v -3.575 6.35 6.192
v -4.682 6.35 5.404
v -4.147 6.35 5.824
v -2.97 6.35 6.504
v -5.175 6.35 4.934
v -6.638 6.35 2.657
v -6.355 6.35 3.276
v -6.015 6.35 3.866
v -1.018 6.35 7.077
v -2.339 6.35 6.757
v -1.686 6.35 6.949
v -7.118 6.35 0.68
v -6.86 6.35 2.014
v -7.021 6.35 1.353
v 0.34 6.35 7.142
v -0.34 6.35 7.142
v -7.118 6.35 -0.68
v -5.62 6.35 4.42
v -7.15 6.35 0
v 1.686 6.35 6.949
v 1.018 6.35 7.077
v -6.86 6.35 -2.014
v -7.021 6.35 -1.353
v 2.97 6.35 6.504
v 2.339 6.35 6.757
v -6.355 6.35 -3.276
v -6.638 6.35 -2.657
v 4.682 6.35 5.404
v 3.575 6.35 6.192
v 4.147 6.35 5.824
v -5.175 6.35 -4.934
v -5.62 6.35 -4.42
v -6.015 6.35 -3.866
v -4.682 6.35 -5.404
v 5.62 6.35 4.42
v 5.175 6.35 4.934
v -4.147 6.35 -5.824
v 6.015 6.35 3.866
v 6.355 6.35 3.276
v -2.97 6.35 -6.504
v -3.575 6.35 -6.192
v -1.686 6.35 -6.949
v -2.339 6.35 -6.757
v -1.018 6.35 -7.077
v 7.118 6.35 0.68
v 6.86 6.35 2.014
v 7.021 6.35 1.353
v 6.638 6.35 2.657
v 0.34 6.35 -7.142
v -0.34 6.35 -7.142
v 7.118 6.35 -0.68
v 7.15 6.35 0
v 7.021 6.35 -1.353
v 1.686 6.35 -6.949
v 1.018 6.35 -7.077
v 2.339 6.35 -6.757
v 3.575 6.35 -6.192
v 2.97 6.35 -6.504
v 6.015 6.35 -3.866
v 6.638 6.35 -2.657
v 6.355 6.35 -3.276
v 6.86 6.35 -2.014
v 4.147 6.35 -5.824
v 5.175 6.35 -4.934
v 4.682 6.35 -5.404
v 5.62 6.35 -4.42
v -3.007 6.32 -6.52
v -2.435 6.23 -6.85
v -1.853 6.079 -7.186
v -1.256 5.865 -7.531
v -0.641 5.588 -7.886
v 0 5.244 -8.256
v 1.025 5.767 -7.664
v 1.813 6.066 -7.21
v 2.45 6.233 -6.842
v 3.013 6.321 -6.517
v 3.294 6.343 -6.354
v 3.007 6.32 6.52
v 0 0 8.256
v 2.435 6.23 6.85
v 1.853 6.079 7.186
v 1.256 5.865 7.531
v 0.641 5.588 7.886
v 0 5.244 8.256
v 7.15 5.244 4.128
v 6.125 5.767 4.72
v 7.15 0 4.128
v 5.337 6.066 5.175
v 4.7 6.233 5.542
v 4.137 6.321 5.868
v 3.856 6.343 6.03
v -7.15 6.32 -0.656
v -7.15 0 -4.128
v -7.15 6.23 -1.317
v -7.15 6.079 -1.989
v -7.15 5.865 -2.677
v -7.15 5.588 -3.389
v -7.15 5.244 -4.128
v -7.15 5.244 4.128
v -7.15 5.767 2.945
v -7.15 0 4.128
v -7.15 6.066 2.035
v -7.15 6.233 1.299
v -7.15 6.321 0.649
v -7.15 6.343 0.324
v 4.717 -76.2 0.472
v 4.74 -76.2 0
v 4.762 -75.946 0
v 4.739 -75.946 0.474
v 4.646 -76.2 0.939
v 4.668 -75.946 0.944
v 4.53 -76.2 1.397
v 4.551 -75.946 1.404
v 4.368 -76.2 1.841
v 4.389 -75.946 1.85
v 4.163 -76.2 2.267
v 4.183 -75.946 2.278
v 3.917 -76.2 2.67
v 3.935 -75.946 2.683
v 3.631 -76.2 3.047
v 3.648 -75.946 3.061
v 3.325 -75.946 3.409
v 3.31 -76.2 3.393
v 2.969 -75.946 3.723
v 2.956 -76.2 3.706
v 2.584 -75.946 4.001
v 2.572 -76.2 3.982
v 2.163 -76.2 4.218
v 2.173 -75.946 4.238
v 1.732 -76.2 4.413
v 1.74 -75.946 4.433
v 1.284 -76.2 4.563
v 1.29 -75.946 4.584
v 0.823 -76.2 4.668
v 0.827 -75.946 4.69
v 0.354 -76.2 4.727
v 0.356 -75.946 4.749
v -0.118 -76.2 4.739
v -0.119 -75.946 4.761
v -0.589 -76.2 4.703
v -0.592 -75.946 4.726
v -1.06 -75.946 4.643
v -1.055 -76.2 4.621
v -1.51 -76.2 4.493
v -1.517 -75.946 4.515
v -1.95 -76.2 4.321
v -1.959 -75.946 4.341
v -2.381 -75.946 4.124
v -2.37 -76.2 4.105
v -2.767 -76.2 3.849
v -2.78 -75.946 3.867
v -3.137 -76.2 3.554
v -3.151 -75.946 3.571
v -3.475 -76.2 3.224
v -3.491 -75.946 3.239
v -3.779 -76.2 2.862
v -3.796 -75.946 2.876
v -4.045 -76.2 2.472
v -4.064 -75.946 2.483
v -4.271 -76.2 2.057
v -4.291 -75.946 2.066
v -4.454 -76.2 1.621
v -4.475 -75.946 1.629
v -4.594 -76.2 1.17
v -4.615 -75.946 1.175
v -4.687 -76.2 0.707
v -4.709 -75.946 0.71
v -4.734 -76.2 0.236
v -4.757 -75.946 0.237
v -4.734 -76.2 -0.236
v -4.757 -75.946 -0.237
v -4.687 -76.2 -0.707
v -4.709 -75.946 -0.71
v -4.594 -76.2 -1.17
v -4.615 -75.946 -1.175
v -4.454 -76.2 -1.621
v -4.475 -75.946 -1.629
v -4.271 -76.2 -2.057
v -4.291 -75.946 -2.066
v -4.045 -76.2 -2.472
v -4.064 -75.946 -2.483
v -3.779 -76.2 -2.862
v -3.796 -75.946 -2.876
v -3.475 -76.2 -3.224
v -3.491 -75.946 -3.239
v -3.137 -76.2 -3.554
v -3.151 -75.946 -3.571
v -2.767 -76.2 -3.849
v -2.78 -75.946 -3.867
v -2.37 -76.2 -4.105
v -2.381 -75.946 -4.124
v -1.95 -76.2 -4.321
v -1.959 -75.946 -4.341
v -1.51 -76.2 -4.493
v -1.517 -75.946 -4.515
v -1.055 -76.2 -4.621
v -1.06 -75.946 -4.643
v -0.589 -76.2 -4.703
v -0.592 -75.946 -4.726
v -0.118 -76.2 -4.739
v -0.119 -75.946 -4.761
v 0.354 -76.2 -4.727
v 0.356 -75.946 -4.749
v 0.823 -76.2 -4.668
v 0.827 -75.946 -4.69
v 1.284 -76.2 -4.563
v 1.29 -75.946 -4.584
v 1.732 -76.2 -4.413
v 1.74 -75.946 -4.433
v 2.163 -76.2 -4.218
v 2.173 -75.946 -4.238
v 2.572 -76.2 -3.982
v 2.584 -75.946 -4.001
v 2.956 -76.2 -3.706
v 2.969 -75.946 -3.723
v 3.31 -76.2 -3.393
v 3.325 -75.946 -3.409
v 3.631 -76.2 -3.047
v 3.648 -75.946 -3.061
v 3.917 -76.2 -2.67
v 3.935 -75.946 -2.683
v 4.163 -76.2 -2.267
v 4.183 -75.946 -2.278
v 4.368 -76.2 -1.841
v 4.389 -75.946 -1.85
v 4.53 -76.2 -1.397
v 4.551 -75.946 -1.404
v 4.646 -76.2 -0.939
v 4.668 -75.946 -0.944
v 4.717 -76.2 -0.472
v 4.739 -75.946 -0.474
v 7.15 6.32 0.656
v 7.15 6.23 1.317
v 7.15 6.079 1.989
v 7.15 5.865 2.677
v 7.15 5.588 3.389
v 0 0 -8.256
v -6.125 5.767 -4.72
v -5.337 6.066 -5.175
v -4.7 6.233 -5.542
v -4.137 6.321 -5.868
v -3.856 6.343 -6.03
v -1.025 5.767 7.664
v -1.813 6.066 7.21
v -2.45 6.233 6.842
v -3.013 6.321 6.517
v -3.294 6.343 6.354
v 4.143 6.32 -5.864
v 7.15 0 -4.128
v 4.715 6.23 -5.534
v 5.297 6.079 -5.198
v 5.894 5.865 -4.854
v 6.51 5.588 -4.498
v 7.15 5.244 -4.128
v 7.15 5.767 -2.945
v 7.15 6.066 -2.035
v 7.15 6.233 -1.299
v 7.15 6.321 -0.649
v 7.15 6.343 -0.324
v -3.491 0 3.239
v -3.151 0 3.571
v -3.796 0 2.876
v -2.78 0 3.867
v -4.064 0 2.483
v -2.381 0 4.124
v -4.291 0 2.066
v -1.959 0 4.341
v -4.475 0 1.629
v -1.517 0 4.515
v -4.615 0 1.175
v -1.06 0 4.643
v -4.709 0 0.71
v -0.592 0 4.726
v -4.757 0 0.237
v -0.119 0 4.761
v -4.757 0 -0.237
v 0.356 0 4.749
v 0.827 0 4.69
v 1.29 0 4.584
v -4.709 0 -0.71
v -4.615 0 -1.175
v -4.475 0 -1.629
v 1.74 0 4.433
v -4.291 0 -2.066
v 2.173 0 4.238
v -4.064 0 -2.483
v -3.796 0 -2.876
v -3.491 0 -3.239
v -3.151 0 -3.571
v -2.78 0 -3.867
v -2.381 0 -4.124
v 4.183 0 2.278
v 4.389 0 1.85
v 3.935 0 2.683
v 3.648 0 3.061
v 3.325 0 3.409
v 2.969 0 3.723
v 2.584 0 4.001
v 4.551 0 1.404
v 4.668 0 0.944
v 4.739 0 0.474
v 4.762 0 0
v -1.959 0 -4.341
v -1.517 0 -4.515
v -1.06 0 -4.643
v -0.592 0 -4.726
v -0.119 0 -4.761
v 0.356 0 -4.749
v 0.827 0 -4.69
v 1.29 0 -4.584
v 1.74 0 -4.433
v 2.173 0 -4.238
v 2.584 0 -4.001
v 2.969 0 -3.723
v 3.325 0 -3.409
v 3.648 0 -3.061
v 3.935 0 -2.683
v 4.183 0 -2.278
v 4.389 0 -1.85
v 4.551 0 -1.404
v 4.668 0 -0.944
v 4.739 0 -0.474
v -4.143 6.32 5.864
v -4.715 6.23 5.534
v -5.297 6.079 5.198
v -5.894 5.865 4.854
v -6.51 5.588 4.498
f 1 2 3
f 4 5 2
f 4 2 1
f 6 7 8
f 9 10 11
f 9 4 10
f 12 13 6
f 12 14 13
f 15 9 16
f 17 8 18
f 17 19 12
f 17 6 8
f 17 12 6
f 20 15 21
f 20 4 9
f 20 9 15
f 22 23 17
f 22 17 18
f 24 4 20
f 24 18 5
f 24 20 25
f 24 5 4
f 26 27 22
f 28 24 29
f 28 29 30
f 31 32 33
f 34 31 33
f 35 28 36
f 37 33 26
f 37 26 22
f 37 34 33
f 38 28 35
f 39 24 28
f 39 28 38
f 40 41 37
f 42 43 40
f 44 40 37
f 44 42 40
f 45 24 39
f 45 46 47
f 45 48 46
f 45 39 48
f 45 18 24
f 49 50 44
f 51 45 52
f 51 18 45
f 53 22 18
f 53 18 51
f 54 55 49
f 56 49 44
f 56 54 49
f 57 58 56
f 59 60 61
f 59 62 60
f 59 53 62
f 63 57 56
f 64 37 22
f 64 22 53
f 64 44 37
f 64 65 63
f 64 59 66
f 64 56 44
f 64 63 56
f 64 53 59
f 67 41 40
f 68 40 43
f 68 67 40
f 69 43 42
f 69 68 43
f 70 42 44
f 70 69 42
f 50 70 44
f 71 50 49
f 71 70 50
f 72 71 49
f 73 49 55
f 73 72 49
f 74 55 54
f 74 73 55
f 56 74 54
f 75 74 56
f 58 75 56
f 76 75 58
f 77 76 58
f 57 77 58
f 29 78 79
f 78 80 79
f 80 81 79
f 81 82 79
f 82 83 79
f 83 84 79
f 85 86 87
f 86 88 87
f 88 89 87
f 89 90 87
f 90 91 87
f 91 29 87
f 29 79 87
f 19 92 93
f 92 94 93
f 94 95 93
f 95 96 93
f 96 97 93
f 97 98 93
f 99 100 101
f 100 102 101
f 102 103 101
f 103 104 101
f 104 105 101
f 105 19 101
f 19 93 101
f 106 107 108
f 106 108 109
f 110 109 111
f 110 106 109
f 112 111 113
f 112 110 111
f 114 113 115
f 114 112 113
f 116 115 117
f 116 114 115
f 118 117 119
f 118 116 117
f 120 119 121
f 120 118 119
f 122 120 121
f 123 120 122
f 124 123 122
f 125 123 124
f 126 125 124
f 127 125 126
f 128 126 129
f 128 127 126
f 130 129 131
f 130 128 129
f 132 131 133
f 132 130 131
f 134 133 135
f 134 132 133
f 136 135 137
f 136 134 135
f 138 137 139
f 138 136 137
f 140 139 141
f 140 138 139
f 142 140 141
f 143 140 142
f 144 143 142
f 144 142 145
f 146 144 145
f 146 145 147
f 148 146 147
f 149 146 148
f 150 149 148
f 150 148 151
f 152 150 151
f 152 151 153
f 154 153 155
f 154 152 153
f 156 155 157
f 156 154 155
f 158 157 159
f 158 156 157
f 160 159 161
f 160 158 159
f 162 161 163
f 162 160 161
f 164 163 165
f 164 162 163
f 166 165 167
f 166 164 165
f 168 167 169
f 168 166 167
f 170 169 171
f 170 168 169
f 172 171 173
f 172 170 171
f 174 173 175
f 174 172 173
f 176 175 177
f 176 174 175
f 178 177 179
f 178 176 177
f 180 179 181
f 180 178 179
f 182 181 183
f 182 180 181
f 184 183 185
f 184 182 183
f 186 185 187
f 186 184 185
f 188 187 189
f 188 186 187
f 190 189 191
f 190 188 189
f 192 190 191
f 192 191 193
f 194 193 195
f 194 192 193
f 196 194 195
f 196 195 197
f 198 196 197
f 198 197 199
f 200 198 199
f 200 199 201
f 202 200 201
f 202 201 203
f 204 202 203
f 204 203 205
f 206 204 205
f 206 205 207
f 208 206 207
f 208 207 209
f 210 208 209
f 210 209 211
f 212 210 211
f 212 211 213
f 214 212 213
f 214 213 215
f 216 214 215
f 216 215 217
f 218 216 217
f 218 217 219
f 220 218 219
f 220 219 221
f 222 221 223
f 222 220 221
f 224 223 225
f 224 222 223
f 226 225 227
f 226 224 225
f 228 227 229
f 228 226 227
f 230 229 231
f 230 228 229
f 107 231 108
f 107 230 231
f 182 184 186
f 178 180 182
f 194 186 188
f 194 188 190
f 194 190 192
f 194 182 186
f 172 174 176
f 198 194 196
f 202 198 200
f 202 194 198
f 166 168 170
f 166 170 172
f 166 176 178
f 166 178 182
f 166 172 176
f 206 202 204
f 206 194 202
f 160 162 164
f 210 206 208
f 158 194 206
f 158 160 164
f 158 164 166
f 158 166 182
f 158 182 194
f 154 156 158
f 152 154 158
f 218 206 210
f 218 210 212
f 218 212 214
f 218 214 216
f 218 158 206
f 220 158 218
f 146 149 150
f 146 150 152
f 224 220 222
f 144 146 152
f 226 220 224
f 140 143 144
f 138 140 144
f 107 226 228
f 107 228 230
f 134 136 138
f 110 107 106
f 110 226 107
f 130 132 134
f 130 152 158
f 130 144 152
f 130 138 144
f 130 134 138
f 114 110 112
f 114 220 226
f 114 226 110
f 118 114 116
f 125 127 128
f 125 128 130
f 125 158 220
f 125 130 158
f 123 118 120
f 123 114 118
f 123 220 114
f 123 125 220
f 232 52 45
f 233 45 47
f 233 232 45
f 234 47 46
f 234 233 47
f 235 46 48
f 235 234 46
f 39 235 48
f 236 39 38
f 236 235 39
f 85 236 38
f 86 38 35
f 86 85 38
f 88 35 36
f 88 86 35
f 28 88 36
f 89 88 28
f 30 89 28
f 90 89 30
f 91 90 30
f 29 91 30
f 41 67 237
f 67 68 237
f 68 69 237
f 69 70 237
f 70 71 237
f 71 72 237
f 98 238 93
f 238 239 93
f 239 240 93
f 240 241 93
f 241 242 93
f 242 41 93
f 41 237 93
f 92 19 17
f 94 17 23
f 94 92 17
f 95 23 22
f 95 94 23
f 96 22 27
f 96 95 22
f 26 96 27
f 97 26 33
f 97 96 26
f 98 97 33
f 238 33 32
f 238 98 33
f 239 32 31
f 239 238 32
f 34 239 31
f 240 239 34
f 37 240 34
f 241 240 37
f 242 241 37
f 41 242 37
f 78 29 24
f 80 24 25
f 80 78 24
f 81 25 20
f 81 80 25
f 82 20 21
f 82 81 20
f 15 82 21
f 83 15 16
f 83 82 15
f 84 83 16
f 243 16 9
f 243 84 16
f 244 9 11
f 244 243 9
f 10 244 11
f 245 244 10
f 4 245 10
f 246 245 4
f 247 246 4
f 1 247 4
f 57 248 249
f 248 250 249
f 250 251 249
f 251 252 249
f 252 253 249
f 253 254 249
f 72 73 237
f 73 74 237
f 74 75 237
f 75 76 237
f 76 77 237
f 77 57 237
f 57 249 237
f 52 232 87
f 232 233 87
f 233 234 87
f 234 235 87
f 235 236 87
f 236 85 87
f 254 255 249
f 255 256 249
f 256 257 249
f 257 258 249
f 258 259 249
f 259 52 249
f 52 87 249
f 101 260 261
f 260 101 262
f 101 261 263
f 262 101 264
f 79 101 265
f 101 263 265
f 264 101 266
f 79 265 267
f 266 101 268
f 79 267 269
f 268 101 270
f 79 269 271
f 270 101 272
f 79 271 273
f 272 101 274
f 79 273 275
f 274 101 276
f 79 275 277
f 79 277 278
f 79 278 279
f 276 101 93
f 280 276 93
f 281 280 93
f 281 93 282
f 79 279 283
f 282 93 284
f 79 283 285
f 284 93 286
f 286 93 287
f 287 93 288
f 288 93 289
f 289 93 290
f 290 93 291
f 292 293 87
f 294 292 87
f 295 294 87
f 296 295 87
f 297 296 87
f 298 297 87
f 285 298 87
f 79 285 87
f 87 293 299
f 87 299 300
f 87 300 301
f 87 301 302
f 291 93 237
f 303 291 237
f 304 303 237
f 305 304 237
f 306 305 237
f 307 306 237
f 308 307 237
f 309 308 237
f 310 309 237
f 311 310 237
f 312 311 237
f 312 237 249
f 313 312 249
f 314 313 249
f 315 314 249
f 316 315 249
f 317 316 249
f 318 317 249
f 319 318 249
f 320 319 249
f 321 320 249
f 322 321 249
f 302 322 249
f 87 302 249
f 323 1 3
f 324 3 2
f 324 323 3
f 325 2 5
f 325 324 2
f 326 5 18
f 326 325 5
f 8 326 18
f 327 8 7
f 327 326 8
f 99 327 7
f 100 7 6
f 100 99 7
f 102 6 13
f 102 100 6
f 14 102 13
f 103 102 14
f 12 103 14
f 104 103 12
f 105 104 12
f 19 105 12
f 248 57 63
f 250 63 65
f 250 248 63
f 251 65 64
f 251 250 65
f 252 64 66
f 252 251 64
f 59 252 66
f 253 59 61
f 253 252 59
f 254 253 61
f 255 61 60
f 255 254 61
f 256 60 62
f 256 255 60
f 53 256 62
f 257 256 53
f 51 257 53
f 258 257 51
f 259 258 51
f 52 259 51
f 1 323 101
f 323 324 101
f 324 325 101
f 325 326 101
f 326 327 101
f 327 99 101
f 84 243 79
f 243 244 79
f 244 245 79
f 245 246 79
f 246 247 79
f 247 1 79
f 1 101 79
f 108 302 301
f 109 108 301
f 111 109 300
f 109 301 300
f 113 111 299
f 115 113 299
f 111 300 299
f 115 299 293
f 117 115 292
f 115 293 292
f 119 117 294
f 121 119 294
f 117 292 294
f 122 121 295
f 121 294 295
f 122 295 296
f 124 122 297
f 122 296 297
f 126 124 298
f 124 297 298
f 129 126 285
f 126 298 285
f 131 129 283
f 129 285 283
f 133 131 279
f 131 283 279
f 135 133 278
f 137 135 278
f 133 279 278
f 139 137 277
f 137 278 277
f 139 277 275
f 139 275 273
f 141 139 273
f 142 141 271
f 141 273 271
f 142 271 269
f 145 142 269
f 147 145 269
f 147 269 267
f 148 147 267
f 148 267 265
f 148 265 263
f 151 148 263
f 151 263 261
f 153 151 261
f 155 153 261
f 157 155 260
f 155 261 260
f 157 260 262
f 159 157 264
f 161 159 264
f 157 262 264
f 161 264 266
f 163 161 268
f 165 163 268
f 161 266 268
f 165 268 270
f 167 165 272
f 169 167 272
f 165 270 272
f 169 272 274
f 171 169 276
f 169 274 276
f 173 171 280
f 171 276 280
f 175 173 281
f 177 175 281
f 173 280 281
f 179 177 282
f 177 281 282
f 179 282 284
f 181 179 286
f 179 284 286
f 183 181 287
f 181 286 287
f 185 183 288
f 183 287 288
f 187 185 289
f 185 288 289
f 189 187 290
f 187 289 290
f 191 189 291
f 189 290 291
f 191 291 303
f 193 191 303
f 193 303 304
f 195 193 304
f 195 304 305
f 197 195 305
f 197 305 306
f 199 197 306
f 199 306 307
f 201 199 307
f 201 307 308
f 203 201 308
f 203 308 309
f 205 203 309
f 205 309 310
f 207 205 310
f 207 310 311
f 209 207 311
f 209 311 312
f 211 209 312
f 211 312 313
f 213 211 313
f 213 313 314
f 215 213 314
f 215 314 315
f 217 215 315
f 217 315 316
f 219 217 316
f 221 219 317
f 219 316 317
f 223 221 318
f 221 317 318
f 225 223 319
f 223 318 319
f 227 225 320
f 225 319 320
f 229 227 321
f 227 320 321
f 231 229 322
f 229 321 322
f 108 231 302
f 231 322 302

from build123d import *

# Parameters (mm, degrees)
BOSS_EXTRUDE1_DEPTH = 6.35
SKETCH2_R           = 4.7625
BOSS_EXTRUDE2_DEPTH = 76.2
SKETCH3_OUTSIDE_W   = 74.018
SKETCH3_OUTSIDE_H   = 76.23
SKETCH3_OUTSIDE_R   = 7.1501
CUT_EXTRUDE1_DEPTH  = 20.32
CUT_EXTRUDE1_TAPER  = 45
CHAMFER1_SIZE       = 0.254
CHAMFER1_SIZE2      = 0.022222121


with BuildPart() as part:
    # Sketch1 → Boss-Extrude1 (new body)
    with BuildSketch(Plane(origin=(0, 0, 0), x_dir=(1, 0, 0), z_dir=(0, 1, 0))):
        Polygon((0, 8.256224319), (-7.1501, 4.12811216), (-7.1501, -4.12811216), (0, -8.256224319), (7.1501, -4.12811216), (7.1501, 4.12811216), align=None)
    extrude(amount=BOSS_EXTRUDE1_DEPTH)

    # Sketch2 → Boss-Extrude2 (add)
    with BuildSketch(Plane.XZ):
        Circle(SKETCH2_R)
    extrude(amount=BOSS_EXTRUDE2_DEPTH)

    # Sketch3 outside → Cut-Extrude1 (cut)
    with BuildSketch(Plane(origin=(0, 6.35, 0), x_dir=(1, 0, 0), z_dir=(0, 1, 0))):
        Rectangle(SKETCH3_OUTSIDE_W, SKETCH3_OUTSIDE_H)
        Circle(SKETCH3_OUTSIDE_R, mode=Mode.SUBTRACT)
    extrude(amount=-CUT_EXTRUDE1_DEPTH, taper=CUT_EXTRUDE1_TAPER, mode=Mode.SUBTRACT)

    # Chamfer1
    chamfer1_edges = [part.edges().sort_by_distance(p)[0] for p in [
        (-4.7625, -76.2, 0),
    ]]
    chamfer1_side = [part.faces().sort_by_distance(p)[0] for p in [
        (-4.7625, -38.1, 0),
    ]]
    chamfer(chamfer1_edges, length=CHAMFER1_SIZE, length2=CHAMFER1_SIZE2, reference=chamfer1_side[0])


solid = part.part
